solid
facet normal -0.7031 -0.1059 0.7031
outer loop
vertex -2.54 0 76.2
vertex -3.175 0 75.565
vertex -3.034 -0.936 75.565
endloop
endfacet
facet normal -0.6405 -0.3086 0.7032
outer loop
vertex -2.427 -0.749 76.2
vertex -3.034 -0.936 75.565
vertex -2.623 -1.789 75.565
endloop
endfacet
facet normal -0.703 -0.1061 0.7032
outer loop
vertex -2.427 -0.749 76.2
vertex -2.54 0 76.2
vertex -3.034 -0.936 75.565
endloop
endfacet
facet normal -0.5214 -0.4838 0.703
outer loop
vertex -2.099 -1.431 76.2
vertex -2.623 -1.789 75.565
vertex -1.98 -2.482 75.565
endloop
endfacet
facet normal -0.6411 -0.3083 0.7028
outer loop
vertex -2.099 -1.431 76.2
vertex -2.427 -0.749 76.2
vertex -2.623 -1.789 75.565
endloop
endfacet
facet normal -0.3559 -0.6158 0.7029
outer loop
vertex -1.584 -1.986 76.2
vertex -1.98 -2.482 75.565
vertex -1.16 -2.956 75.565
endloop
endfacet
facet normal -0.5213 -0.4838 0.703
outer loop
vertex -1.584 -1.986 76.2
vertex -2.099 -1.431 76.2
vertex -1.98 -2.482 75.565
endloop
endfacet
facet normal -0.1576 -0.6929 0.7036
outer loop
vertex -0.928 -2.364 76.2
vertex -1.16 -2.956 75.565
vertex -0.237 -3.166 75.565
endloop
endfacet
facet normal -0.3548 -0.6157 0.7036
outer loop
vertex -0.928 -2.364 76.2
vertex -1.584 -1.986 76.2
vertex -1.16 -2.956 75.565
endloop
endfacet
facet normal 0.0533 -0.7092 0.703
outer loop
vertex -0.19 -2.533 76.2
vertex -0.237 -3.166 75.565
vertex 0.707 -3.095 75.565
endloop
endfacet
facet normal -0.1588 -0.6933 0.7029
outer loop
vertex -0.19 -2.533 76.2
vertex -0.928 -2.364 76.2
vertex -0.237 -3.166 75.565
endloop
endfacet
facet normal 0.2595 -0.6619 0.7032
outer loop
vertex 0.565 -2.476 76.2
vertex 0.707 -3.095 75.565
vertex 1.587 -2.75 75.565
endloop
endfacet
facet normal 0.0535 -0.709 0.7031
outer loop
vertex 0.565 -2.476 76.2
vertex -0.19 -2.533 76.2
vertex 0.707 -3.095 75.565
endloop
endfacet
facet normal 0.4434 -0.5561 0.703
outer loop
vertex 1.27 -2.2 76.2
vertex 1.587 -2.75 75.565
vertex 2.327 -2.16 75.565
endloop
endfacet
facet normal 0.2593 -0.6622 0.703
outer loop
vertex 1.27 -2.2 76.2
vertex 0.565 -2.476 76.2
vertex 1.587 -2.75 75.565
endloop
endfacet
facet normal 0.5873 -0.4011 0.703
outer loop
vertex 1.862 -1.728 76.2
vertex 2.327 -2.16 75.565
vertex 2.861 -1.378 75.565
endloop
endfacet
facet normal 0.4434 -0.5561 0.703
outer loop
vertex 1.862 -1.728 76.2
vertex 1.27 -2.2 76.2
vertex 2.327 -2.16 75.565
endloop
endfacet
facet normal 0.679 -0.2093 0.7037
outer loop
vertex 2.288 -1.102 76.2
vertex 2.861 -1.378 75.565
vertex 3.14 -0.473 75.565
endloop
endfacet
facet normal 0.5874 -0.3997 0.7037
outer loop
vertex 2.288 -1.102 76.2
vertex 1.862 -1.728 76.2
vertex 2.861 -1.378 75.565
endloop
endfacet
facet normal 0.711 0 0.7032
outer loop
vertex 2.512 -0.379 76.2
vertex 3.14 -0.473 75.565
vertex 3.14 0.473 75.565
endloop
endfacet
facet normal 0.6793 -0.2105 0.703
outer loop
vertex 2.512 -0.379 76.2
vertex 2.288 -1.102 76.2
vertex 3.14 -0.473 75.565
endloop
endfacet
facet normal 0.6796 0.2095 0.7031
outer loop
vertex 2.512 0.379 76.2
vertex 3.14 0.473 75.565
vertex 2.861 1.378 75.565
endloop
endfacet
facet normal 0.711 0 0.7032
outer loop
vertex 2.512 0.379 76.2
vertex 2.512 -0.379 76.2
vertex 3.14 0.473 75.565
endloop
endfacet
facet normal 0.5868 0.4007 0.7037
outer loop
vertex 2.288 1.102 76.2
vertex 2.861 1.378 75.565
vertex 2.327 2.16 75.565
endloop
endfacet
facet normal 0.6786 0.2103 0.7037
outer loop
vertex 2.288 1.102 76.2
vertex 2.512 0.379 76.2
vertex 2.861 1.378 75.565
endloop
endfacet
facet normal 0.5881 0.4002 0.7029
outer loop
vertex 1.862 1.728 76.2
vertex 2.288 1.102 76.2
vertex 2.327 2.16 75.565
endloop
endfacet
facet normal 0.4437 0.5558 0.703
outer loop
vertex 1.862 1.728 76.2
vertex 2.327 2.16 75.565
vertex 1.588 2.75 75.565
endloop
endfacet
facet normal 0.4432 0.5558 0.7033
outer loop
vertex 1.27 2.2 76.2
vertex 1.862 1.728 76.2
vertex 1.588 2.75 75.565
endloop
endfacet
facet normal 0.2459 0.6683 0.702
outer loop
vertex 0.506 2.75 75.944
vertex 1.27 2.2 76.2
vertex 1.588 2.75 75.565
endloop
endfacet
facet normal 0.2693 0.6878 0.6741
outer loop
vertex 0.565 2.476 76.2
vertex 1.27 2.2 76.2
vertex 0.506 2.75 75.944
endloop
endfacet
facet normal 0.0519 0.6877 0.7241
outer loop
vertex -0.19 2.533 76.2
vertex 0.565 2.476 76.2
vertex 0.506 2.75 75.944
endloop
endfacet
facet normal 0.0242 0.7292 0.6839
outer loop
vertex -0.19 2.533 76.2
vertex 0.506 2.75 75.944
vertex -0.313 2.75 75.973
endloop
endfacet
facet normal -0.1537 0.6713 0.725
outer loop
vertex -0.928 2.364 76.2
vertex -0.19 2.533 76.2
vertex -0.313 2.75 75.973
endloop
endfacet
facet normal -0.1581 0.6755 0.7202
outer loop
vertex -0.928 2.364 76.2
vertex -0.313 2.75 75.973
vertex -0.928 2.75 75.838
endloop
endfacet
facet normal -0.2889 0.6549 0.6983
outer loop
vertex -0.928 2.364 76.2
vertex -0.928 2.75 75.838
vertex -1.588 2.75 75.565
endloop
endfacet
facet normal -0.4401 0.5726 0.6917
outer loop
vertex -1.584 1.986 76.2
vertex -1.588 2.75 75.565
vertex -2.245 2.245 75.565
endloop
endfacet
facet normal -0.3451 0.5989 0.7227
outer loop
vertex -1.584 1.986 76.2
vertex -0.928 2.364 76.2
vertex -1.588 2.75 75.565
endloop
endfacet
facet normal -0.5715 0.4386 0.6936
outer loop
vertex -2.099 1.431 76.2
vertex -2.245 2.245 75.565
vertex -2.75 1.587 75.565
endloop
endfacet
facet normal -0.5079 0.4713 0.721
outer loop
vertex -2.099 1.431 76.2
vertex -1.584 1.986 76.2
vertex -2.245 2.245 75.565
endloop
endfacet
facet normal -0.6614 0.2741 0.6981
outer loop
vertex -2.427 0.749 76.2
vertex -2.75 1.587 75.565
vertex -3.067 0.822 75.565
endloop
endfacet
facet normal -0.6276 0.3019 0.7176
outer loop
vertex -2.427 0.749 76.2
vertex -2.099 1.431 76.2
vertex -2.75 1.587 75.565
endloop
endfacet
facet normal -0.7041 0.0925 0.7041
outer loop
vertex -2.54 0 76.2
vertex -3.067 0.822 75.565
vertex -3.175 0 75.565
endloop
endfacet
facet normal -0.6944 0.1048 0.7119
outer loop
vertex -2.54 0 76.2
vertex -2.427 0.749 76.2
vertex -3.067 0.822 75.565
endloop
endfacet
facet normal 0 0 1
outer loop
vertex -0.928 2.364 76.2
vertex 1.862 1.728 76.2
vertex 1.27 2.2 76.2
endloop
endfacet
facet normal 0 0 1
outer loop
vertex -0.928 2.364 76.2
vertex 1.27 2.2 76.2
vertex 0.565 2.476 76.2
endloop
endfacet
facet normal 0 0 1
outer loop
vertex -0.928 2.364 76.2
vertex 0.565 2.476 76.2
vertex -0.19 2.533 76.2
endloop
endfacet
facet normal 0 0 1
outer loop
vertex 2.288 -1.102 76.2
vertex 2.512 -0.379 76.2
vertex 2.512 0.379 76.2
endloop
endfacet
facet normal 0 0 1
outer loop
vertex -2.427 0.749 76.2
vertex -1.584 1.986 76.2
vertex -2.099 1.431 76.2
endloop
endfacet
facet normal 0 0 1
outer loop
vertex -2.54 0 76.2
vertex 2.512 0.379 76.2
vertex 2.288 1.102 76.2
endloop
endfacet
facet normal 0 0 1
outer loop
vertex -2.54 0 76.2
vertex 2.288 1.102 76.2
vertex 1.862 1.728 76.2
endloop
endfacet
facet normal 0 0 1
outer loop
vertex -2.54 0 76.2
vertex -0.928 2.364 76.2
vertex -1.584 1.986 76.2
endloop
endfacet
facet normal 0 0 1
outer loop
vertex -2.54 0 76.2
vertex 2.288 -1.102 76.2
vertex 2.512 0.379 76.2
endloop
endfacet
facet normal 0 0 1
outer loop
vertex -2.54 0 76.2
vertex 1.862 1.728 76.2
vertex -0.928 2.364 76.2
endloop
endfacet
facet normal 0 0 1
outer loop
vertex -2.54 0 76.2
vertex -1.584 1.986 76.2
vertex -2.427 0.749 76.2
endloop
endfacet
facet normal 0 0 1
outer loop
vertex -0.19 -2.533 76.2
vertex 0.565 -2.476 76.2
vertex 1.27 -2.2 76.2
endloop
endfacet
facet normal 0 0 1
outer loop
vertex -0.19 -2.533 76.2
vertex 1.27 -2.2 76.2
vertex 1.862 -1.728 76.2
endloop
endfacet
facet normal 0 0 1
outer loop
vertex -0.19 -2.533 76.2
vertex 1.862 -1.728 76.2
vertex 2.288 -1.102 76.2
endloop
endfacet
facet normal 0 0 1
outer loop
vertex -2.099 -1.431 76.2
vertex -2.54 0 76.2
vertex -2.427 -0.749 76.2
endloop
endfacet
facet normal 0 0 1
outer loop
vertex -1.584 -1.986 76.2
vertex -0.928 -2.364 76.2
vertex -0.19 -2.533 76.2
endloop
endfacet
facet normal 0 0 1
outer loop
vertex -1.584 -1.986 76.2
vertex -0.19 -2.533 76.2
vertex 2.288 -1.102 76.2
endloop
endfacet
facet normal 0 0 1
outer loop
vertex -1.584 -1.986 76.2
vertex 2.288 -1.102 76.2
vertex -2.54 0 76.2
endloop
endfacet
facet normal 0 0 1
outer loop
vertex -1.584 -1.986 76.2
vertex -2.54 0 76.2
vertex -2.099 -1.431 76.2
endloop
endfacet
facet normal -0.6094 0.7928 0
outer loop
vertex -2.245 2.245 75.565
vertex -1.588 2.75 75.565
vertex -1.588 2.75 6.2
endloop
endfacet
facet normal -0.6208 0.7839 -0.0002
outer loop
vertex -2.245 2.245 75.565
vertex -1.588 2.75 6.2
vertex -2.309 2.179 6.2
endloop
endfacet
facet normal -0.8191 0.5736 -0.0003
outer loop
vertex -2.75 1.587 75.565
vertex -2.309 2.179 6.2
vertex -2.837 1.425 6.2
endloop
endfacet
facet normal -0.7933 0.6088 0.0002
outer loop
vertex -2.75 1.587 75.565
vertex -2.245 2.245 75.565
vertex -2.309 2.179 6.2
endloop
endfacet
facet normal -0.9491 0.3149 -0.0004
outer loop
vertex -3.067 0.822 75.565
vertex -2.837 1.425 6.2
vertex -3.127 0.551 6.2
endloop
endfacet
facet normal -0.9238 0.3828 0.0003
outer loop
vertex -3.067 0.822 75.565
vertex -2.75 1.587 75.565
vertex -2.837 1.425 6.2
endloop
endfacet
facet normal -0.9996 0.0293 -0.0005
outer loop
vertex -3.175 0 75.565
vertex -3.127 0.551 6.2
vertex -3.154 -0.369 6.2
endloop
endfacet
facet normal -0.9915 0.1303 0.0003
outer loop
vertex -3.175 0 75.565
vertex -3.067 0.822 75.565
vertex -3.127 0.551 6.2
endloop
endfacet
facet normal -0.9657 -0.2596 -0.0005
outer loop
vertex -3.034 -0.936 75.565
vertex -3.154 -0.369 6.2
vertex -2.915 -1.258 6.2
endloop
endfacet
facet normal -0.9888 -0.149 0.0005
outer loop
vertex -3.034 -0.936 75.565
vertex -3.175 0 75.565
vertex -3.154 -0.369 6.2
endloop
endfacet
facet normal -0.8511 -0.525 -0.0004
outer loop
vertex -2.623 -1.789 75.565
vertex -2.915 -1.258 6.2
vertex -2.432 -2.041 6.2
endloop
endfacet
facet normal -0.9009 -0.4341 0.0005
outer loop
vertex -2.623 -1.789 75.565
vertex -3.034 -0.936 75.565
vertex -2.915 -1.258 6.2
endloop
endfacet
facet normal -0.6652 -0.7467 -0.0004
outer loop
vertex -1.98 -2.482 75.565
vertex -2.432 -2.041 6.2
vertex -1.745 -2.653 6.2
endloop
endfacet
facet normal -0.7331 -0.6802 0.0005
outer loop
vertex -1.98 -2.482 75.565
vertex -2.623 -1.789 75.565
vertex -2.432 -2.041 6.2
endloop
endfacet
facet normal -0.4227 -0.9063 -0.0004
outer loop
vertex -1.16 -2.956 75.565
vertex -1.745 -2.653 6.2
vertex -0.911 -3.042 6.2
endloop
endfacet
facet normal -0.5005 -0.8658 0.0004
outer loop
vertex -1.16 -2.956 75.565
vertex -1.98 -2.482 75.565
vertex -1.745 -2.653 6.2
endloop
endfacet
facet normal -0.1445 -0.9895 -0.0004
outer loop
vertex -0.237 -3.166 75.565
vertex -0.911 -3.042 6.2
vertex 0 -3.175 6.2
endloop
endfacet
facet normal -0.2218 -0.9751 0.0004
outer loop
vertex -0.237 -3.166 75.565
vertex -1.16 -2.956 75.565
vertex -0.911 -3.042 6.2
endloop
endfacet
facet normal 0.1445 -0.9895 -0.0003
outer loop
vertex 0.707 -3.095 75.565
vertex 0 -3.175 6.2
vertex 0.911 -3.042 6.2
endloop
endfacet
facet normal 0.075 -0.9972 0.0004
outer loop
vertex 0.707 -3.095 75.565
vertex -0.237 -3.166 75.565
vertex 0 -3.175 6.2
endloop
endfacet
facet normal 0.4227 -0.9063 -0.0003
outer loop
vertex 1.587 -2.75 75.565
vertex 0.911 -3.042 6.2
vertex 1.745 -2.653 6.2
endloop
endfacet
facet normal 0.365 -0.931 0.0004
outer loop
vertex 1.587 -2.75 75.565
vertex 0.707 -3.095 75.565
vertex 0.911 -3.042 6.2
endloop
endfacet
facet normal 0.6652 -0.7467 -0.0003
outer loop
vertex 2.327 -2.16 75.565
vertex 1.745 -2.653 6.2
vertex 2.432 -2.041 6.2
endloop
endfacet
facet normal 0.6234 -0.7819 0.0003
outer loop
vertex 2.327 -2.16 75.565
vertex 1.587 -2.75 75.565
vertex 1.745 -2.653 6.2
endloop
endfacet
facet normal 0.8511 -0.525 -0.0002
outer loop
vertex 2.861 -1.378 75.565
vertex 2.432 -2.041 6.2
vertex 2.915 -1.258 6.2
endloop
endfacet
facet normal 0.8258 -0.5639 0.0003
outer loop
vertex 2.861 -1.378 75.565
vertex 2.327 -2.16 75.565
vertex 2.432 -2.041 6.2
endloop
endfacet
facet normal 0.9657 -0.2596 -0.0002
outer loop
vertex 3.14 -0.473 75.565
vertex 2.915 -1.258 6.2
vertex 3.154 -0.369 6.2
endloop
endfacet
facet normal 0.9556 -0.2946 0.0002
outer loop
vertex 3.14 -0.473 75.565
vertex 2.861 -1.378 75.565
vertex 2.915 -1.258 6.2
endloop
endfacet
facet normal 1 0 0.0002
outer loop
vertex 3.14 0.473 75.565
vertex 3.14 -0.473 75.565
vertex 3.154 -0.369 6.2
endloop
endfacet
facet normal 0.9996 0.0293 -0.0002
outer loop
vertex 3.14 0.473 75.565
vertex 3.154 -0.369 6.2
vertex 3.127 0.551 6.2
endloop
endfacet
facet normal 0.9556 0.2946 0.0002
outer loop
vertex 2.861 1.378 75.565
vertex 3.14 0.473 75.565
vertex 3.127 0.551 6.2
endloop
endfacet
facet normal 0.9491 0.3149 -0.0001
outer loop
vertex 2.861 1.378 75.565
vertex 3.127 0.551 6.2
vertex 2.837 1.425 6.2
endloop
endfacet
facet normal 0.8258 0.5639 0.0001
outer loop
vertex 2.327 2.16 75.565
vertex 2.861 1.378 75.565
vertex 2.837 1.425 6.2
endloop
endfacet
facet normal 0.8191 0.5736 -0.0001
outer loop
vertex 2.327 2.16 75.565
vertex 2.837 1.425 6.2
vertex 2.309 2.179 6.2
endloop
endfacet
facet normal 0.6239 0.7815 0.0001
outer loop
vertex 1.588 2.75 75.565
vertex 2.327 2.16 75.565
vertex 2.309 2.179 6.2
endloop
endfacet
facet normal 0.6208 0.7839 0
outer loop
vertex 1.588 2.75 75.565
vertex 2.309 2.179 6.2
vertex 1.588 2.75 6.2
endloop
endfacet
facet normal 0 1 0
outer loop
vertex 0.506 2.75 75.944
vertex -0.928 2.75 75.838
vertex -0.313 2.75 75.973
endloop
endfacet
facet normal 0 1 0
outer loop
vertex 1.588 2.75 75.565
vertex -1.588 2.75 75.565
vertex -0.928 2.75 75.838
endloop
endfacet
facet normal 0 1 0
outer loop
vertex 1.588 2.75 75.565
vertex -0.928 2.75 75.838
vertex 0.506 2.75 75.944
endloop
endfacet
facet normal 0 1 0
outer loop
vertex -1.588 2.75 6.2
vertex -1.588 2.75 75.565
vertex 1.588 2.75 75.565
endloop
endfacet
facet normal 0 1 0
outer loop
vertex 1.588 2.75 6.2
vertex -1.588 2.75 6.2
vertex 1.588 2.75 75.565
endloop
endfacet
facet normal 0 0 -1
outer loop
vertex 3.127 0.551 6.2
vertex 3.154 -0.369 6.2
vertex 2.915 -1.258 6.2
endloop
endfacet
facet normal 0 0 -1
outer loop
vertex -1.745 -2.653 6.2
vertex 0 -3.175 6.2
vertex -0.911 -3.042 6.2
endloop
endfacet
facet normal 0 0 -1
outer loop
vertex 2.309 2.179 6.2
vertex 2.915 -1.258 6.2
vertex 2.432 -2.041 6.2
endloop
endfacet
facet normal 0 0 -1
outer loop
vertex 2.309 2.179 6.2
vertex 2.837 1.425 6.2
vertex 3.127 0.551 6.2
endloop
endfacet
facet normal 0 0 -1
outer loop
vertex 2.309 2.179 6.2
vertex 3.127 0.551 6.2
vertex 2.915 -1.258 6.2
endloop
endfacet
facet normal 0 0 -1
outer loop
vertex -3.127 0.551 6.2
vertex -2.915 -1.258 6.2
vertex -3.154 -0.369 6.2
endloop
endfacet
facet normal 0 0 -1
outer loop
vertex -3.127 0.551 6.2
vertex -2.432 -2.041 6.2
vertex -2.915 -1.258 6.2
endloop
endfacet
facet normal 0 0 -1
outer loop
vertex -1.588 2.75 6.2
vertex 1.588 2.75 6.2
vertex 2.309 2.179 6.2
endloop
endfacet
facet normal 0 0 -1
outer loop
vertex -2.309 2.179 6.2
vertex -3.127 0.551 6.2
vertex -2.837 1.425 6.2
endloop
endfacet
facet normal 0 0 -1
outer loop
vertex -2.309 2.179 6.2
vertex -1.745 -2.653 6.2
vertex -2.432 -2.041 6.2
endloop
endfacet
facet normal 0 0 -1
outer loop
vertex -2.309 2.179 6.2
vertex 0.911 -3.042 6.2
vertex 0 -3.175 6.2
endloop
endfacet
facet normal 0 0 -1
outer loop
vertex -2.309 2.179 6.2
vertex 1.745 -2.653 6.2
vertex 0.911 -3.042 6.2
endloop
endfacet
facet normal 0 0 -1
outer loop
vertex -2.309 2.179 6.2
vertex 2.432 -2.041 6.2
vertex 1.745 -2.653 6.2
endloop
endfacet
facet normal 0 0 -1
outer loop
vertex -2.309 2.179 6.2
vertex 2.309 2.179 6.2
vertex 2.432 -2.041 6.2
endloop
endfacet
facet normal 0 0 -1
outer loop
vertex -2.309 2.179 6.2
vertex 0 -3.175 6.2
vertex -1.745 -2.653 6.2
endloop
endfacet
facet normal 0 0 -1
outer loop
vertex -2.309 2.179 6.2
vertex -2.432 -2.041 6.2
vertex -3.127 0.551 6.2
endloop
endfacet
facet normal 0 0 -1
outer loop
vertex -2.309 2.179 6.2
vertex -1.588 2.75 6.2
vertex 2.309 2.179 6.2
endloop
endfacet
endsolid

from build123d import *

# Parameters (mm, degrees)
SKETCH1_R           = 3.175
EXTRUDE1_DEPTH      = 76.2
CHAMFER1_SIZE       = 0.635
EXTRUDE7_DEPTH      = 77.332177029
EXTRUDE7_DEPTH_BACK = 77.332177029
CUT_EXTRUDE1_START  = -82.4
SKETCH14_R          = 3.175
CUT_EXTRUDE1_DEPTH  = 82.4


with BuildPart() as part:
    # Sketch1 → Extrude1 (new, symmetric)
    with BuildSketch(Plane.XY):
        with Locations(Location((0, 0, 0), (0, 0, 180))):
            Circle(SKETCH1_R)
    extrude(amount=EXTRUDE1_DEPTH, both=True)

    # Chamfer1
    chamfer1_edges = [part.edges().sort_by_distance(p)[0] for p in [
        (3.175, 0, -76.2),
        (3.175, 0, 76.2),
    ]]
    chamfer(chamfer1_edges, length=CHAMFER1_SIZE)

    # Sketch13 → Extrude7 (cut, two sides: drawn at the far end of the back side and taken through both)
    with BuildSketch(Plane.XY.offset(-EXTRUDE7_DEPTH_BACK)):
        with BuildLine():
            Line((-1.5875, 2.749630657), (1.5875, 2.749630657))
            ThreePointArc((1.5875, 2.749630657), (0, 3.175), (-1.5875, 2.749630657))
        make_face()
    extrude(amount=EXTRUDE7_DEPTH + EXTRUDE7_DEPTH_BACK, mode=Mode.SUBTRACT)

    # Sketch14 → Cut-Extrude1 (cut)
    with BuildSketch(Plane(origin=(0, 0, -76.2), x_dir=(-1, 0, 0), z_dir=(0, 0, -1)).offset(CUT_EXTRUDE1_START)):
        Circle(SKETCH14_R)
    extrude(amount=CUT_EXTRUDE1_DEPTH, mode=Mode.SUBTRACT)


solid = part.part
